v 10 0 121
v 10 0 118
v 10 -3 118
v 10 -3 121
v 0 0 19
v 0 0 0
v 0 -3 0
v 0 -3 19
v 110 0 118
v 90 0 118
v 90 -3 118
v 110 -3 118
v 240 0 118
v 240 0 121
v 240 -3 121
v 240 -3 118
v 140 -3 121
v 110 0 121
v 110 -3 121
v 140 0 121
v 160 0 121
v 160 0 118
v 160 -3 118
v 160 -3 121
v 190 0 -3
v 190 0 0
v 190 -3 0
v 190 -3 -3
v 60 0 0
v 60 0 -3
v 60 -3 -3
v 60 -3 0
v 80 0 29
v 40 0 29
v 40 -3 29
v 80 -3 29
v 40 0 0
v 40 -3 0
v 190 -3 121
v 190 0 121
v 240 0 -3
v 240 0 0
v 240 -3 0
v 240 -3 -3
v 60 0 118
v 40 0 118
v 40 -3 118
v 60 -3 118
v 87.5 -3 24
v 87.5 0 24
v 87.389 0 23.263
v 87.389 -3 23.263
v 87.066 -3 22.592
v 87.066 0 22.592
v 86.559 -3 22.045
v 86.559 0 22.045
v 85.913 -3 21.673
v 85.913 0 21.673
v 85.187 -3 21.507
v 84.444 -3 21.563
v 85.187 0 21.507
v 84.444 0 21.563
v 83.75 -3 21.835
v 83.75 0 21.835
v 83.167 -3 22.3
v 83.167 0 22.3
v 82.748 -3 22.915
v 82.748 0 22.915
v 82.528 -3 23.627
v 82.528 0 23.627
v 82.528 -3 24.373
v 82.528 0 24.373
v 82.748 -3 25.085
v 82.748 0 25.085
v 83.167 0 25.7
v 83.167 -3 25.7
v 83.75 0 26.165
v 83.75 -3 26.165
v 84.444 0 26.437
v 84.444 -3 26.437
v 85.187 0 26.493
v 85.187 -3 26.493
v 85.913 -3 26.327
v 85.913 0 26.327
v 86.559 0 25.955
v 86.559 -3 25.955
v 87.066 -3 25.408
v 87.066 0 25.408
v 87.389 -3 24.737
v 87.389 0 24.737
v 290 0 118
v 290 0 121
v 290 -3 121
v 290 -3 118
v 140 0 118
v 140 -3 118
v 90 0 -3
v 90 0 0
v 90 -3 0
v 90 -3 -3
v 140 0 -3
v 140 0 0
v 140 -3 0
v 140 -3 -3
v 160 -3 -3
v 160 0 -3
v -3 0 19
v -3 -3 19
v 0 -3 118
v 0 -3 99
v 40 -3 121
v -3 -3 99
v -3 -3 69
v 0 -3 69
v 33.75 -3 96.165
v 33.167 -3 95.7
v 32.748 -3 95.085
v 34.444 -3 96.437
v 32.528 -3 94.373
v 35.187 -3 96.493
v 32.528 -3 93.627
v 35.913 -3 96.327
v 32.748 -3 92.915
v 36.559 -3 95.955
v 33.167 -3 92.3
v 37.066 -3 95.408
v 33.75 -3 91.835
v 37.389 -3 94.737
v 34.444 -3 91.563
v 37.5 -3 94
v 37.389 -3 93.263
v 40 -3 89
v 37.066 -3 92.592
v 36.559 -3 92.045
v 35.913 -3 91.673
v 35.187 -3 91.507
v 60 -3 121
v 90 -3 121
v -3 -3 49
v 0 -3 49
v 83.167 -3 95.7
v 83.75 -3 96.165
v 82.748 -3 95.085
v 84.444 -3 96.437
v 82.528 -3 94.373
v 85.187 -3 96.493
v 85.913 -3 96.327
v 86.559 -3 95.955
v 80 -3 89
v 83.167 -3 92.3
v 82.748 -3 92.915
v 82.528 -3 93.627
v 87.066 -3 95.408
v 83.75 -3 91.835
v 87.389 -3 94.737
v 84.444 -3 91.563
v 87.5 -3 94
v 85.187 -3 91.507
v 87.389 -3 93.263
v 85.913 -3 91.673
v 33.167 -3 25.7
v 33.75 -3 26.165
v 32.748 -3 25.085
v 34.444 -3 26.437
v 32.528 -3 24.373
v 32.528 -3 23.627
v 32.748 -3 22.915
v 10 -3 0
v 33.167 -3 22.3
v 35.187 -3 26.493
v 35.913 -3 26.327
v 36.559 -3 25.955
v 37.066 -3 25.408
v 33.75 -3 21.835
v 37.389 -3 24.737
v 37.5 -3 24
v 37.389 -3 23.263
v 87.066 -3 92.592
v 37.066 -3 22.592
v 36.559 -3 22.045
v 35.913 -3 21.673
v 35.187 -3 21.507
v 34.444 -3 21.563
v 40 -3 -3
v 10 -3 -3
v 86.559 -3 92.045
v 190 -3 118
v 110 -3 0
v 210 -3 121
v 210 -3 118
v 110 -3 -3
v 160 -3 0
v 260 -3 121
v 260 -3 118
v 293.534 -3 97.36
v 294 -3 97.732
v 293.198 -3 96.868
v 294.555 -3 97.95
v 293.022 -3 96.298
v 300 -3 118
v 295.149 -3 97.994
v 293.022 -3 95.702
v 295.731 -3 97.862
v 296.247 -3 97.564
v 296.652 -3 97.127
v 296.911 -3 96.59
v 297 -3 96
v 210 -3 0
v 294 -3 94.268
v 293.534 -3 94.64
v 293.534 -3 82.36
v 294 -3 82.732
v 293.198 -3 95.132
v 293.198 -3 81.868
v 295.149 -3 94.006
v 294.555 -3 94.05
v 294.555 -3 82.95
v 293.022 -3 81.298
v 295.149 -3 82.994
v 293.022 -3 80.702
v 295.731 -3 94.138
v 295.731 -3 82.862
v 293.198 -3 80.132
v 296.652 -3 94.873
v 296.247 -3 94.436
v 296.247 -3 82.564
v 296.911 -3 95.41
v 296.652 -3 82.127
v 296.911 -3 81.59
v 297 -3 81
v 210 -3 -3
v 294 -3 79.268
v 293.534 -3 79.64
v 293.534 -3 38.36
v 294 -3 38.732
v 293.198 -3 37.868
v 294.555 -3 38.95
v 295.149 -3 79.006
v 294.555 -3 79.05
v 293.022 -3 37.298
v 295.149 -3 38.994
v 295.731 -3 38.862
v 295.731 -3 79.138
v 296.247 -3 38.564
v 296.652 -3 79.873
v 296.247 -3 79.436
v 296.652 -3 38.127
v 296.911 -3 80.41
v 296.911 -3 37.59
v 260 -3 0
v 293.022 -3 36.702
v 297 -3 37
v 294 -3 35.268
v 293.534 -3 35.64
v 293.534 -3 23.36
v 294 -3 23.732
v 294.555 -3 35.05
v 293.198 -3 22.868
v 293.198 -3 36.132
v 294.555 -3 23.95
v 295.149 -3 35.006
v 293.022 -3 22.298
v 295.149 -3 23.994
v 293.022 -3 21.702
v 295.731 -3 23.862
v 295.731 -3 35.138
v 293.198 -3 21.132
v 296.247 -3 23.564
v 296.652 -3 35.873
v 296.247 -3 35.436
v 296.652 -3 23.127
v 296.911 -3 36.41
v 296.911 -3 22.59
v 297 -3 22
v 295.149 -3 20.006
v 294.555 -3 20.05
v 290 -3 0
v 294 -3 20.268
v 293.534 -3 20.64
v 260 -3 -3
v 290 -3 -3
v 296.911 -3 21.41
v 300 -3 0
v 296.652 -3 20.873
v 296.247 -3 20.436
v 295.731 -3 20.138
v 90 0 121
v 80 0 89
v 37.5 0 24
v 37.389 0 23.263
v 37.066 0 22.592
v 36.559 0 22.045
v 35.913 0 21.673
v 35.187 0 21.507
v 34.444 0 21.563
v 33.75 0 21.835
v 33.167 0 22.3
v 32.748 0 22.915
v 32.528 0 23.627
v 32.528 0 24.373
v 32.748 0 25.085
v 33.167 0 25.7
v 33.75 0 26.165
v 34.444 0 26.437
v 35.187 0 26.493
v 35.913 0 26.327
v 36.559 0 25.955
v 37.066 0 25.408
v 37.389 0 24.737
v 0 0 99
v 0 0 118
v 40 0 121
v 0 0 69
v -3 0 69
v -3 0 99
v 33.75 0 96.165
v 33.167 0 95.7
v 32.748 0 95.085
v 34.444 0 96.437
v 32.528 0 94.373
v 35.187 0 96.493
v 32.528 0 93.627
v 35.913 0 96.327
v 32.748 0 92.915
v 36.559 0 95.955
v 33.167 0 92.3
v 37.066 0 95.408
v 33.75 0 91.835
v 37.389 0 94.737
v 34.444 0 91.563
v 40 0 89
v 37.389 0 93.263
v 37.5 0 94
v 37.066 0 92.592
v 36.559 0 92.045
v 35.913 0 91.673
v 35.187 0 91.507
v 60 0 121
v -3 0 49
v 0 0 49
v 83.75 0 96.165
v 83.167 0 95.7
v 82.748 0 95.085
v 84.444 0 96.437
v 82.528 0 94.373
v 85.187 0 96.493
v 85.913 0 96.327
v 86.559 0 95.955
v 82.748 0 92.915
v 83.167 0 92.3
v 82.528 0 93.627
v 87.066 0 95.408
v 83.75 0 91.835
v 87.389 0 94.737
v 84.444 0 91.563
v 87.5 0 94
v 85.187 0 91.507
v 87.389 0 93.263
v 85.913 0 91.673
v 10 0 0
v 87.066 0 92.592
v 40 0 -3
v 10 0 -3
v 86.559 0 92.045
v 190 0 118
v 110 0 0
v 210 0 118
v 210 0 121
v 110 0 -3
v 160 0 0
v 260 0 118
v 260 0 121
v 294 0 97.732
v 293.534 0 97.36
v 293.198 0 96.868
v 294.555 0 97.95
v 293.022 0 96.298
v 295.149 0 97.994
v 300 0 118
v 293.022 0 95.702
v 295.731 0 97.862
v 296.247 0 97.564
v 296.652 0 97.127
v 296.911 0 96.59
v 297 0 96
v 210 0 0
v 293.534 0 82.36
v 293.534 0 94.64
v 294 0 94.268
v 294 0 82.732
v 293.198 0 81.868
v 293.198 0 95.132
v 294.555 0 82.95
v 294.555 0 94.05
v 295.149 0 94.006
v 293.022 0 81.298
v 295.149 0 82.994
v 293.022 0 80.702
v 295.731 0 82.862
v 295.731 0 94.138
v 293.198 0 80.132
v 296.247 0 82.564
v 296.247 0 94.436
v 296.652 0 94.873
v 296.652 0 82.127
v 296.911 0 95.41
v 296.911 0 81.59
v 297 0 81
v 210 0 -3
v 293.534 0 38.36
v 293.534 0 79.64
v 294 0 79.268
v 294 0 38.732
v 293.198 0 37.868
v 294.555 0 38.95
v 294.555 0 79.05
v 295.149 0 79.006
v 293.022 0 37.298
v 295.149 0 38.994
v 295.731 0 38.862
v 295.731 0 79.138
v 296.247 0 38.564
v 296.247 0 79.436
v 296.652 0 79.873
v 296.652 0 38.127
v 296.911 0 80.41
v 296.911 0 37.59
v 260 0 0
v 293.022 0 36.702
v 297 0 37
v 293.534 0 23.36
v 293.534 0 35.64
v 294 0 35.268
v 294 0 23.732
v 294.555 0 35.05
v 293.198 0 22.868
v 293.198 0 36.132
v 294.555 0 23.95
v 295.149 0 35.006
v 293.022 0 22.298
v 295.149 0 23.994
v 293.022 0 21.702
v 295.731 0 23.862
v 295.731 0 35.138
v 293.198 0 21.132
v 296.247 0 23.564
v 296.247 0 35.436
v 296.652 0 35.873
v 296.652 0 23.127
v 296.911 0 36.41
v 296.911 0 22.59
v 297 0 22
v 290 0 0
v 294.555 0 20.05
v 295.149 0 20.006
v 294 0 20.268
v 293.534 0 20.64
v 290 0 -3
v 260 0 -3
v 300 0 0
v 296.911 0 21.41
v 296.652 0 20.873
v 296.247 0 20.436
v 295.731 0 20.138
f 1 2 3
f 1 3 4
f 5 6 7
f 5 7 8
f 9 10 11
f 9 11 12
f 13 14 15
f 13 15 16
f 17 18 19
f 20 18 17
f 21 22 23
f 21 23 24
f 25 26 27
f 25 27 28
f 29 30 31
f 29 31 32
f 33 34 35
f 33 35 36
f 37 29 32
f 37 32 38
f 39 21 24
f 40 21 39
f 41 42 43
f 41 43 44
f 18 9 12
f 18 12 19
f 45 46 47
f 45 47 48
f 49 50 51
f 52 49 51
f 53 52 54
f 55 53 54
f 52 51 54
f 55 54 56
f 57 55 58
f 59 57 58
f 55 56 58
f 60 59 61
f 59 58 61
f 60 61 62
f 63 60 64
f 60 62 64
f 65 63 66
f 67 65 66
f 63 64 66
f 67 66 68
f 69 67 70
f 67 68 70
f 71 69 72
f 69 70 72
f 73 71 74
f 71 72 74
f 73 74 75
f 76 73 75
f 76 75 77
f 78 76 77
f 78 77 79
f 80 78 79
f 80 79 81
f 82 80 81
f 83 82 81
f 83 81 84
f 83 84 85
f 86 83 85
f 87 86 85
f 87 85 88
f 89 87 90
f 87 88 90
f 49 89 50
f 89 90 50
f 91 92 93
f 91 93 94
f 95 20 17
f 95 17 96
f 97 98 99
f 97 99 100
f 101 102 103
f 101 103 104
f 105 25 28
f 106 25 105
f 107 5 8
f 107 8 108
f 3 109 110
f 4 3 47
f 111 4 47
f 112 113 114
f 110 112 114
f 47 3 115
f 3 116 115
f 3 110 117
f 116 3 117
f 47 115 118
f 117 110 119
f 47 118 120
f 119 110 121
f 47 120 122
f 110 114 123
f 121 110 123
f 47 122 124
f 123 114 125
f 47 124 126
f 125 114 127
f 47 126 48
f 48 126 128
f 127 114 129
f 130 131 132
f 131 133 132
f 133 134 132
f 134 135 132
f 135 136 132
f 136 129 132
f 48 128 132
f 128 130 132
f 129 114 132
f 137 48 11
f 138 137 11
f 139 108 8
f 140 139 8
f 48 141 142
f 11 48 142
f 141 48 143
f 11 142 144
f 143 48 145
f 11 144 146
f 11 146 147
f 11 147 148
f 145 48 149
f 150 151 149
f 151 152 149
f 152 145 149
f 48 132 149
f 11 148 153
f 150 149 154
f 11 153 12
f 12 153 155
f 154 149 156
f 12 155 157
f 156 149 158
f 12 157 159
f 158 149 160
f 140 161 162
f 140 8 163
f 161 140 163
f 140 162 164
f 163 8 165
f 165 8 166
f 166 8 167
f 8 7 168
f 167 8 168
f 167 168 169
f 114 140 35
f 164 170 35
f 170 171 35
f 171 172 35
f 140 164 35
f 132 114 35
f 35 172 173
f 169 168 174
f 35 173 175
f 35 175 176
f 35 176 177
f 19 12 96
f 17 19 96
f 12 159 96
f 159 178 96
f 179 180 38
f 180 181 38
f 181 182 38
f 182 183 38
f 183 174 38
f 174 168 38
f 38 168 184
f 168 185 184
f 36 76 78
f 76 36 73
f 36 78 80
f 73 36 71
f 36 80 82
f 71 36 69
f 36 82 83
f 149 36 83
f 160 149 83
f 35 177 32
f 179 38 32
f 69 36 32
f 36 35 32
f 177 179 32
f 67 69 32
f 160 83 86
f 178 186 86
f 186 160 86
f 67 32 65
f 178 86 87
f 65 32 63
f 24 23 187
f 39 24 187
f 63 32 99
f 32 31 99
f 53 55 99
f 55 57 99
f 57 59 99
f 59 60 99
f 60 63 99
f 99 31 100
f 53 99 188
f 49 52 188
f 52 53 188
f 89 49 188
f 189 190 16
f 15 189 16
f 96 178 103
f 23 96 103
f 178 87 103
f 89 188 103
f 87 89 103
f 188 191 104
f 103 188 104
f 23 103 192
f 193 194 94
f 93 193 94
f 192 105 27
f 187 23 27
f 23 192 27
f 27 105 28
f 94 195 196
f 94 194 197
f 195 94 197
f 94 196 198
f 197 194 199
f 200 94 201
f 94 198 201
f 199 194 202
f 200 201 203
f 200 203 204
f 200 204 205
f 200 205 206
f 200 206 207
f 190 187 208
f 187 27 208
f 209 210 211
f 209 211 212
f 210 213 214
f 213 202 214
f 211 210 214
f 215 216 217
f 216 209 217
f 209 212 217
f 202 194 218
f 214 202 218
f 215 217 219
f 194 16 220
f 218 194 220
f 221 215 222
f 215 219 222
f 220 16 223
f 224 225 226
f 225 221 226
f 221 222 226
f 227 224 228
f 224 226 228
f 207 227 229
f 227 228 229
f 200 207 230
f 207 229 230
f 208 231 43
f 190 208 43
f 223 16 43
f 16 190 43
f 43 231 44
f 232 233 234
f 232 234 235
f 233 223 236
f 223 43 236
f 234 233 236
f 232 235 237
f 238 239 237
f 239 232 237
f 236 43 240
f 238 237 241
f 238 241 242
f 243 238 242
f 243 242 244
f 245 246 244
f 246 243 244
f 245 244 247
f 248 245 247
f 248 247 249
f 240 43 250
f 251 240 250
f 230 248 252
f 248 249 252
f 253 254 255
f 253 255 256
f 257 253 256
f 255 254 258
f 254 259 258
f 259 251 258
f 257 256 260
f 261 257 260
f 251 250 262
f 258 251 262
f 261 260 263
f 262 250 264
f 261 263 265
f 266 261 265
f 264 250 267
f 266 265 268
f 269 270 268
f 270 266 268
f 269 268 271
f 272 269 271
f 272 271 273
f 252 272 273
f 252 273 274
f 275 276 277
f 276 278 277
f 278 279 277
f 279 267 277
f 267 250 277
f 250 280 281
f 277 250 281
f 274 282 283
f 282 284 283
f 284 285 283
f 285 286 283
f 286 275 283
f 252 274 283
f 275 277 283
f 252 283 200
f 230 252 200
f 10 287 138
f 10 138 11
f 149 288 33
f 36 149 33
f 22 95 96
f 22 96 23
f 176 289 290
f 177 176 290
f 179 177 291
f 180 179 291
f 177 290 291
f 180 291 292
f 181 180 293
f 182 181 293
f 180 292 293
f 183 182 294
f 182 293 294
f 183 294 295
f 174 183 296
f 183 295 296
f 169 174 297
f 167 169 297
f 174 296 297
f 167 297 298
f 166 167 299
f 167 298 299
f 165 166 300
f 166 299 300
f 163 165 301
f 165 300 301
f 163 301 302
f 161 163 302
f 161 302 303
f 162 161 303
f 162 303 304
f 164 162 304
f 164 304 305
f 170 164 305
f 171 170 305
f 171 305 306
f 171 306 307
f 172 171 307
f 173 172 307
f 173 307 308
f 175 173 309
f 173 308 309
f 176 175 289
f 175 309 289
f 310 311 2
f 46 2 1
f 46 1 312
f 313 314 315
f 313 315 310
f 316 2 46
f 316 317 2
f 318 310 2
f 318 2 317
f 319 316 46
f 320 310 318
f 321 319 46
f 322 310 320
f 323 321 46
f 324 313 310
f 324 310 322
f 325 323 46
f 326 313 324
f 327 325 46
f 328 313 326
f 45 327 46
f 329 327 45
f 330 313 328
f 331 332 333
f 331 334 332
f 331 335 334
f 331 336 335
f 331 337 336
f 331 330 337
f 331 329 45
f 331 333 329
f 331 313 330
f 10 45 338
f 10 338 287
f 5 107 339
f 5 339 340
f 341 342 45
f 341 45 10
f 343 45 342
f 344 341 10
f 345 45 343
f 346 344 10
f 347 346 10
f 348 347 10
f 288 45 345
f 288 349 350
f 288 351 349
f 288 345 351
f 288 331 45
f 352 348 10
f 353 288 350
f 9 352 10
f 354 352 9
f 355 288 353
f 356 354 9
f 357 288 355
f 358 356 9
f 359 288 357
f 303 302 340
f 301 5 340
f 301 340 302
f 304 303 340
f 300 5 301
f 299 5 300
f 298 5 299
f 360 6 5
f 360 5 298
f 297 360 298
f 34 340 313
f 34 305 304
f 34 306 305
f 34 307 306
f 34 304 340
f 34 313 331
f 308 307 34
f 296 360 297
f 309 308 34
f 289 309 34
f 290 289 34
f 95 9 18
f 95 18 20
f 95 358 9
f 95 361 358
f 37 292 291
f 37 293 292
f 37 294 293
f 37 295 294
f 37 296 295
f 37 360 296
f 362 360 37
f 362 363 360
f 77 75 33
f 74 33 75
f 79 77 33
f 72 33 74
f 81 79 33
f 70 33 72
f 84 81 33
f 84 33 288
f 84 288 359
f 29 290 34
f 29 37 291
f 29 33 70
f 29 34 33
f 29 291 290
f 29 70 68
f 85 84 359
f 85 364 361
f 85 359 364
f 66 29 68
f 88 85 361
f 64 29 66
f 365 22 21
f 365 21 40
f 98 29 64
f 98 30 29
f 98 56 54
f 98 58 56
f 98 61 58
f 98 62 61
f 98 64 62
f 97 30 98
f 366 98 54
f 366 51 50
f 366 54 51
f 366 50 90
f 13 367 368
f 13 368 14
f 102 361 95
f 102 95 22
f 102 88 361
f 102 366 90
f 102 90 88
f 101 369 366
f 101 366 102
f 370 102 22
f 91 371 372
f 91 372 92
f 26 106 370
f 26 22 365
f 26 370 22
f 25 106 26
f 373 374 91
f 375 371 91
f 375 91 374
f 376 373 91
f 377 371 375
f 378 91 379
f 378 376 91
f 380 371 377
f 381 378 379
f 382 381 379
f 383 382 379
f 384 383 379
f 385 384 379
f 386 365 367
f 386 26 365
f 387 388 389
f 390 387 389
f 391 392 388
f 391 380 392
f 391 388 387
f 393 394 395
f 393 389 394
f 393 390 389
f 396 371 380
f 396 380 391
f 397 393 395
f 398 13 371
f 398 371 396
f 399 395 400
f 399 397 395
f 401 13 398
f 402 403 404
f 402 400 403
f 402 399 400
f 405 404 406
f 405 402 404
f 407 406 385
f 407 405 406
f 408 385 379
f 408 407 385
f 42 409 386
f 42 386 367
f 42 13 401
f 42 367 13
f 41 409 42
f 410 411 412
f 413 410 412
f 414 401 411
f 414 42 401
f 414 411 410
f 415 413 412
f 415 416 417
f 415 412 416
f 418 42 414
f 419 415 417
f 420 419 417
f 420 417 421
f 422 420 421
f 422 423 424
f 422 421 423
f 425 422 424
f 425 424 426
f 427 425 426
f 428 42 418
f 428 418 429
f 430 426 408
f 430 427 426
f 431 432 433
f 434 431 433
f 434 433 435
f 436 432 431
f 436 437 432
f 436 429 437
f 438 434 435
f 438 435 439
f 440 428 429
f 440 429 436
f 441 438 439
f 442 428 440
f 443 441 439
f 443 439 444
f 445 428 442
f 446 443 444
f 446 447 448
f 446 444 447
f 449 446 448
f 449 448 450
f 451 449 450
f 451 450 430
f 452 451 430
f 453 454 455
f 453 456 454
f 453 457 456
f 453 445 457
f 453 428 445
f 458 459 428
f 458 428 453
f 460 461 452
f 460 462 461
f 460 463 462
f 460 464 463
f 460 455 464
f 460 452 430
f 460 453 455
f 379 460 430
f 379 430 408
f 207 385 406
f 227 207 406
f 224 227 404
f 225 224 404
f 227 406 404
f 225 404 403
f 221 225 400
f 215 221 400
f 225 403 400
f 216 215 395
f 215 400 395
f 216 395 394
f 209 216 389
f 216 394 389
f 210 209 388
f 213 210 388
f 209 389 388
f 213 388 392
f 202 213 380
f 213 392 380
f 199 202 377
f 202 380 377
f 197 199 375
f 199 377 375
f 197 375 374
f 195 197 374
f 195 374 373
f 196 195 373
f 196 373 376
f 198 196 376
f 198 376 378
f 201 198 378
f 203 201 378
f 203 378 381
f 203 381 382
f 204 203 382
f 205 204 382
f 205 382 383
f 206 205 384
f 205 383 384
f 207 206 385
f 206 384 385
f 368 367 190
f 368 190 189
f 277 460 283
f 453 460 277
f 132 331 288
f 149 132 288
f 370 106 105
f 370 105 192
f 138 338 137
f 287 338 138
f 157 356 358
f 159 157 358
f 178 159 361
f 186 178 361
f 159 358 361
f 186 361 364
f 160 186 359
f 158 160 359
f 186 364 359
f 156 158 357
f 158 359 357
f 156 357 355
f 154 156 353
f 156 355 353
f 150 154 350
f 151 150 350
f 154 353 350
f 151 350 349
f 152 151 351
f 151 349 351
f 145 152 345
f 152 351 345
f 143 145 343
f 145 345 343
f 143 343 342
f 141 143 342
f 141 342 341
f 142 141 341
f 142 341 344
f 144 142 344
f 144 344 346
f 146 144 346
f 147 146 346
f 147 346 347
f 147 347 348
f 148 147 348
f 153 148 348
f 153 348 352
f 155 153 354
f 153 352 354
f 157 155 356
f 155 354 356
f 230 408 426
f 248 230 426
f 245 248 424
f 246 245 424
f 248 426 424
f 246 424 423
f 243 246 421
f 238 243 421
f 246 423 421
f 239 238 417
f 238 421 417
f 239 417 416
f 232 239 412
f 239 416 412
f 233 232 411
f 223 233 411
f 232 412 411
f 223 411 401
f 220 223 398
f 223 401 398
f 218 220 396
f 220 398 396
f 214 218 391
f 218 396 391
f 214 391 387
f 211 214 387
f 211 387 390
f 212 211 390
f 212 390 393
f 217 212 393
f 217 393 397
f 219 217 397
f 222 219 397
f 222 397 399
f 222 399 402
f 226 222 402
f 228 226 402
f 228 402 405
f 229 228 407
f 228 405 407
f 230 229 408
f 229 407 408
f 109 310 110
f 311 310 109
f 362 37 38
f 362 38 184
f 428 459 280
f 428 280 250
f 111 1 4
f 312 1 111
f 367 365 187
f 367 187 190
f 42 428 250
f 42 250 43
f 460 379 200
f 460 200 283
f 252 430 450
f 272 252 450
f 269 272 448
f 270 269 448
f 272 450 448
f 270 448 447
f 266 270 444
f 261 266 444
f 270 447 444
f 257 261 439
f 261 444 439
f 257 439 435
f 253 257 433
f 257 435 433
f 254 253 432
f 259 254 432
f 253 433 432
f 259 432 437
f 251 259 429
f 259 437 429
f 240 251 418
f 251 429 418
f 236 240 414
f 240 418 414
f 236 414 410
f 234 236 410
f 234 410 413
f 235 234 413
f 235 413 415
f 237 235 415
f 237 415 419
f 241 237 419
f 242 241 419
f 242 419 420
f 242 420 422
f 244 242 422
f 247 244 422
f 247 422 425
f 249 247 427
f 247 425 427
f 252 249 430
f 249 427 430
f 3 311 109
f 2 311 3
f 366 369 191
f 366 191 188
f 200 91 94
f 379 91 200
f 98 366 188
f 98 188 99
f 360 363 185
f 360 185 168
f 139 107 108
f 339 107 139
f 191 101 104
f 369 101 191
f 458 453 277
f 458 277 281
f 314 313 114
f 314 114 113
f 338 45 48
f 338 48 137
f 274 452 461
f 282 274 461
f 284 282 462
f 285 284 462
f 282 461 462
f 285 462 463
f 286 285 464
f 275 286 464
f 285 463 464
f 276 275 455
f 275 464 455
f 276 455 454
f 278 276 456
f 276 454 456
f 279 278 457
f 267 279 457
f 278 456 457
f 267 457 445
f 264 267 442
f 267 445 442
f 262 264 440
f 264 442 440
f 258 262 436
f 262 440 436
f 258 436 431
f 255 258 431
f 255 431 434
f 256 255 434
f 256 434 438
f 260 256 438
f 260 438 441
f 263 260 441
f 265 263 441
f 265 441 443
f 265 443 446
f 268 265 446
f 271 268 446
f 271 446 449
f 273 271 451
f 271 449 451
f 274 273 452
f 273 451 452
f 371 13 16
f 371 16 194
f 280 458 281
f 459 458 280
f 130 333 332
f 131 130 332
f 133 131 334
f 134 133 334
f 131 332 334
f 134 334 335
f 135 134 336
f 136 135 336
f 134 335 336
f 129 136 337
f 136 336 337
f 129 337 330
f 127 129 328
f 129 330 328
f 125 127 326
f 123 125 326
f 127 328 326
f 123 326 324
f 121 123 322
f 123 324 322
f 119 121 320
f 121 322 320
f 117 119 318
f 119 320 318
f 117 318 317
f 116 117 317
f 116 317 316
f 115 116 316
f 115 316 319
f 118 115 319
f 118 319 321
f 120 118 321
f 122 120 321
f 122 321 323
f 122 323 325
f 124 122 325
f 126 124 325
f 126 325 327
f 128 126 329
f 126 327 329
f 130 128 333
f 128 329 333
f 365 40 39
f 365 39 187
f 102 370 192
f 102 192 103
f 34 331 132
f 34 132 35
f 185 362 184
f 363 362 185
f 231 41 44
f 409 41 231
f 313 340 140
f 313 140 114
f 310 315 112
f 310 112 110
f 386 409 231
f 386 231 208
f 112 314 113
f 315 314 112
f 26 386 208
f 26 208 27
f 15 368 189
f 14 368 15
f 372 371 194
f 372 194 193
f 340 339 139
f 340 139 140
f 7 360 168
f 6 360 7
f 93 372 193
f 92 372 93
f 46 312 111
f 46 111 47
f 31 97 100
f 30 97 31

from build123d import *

# Parameters (mm, degrees)
EXTRUDE_1_DEPTH     = 3
SKETCH_5_R          = 2
SKETCH_5_R_2        = 2.5
SKETCH_5_W          = 40
SKETCH_5_H          = 60
CUT_EXTRUDE_1_DEPTH = 3


with BuildPart() as part:
    # 草图4 → 凸台-拉伸1 (new body)
    with BuildSketch(Plane(origin=(0, 0, 0), x_dir=(1, 0, 0), z_dir=(0, 1, 0))):
        Polygon((10, 0), (0, 0), (0, -19), (-3, -19), (-3, -49), (0, -49), (0, -69), (-3, -69), (-3, -99), (0, -99), (0, -118), (10, -118), (10, -121), (40, -121), (40, -118), (60, -118), (60, -121), (90, -121), (90, -118), (110, -118), (110, -121), (140, -121), (140, -118), (160, -118), (160, -121), (190, -121), (190, -118), (210, -118), (210, -121), (240, -121), (240, -118), (260, -118), (260, -121), (290, -121), (290, -118), (300, -118), (300, 0), (290, 0), (290, 3), (260, 3), (260, 0), (240, 0), (240, 3), (210, 3), (210, 0), (190, 0), (190, 3), (160, 3), (160, 0), (140, 0), (140, 3), (110, 3), (110, 0), (90, 0), (90, 3), (60, 3), (60, 0), (40, 0), (40, 3), (10, 3), align=None)
    extrude(amount=-EXTRUDE_1_DEPTH)

    # 草图5 → 切除-拉伸1 (cut)
    with BuildSketch(Plane(origin=(0, 0, 0), x_dir=(1, 0, 0), z_dir=(0, 1, 0))):
        with Locations((295, -96)):
            Circle(SKETCH_5_R)
        with Locations((295, -81)):
            Circle(SKETCH_5_R)
        with Locations((295, -22)):
            Circle(SKETCH_5_R)
        with Locations((295, -37)):
            Circle(SKETCH_5_R)
        with Locations((35, -24)):
            Circle(SKETCH_5_R_2)
        with Locations((35, -94)):
            Circle(SKETCH_5_R_2)
        with Locations((85, -94)):
            Circle(SKETCH_5_R_2)
        with Locations((85, -24)):
            Circle(SKETCH_5_R_2)
        with Locations((60, -59)):
            Rectangle(SKETCH_5_W, SKETCH_5_H)
    extrude(amount=-CUT_EXTRUDE_1_DEPTH, mode=Mode.SUBTRACT)


solid = part.part
